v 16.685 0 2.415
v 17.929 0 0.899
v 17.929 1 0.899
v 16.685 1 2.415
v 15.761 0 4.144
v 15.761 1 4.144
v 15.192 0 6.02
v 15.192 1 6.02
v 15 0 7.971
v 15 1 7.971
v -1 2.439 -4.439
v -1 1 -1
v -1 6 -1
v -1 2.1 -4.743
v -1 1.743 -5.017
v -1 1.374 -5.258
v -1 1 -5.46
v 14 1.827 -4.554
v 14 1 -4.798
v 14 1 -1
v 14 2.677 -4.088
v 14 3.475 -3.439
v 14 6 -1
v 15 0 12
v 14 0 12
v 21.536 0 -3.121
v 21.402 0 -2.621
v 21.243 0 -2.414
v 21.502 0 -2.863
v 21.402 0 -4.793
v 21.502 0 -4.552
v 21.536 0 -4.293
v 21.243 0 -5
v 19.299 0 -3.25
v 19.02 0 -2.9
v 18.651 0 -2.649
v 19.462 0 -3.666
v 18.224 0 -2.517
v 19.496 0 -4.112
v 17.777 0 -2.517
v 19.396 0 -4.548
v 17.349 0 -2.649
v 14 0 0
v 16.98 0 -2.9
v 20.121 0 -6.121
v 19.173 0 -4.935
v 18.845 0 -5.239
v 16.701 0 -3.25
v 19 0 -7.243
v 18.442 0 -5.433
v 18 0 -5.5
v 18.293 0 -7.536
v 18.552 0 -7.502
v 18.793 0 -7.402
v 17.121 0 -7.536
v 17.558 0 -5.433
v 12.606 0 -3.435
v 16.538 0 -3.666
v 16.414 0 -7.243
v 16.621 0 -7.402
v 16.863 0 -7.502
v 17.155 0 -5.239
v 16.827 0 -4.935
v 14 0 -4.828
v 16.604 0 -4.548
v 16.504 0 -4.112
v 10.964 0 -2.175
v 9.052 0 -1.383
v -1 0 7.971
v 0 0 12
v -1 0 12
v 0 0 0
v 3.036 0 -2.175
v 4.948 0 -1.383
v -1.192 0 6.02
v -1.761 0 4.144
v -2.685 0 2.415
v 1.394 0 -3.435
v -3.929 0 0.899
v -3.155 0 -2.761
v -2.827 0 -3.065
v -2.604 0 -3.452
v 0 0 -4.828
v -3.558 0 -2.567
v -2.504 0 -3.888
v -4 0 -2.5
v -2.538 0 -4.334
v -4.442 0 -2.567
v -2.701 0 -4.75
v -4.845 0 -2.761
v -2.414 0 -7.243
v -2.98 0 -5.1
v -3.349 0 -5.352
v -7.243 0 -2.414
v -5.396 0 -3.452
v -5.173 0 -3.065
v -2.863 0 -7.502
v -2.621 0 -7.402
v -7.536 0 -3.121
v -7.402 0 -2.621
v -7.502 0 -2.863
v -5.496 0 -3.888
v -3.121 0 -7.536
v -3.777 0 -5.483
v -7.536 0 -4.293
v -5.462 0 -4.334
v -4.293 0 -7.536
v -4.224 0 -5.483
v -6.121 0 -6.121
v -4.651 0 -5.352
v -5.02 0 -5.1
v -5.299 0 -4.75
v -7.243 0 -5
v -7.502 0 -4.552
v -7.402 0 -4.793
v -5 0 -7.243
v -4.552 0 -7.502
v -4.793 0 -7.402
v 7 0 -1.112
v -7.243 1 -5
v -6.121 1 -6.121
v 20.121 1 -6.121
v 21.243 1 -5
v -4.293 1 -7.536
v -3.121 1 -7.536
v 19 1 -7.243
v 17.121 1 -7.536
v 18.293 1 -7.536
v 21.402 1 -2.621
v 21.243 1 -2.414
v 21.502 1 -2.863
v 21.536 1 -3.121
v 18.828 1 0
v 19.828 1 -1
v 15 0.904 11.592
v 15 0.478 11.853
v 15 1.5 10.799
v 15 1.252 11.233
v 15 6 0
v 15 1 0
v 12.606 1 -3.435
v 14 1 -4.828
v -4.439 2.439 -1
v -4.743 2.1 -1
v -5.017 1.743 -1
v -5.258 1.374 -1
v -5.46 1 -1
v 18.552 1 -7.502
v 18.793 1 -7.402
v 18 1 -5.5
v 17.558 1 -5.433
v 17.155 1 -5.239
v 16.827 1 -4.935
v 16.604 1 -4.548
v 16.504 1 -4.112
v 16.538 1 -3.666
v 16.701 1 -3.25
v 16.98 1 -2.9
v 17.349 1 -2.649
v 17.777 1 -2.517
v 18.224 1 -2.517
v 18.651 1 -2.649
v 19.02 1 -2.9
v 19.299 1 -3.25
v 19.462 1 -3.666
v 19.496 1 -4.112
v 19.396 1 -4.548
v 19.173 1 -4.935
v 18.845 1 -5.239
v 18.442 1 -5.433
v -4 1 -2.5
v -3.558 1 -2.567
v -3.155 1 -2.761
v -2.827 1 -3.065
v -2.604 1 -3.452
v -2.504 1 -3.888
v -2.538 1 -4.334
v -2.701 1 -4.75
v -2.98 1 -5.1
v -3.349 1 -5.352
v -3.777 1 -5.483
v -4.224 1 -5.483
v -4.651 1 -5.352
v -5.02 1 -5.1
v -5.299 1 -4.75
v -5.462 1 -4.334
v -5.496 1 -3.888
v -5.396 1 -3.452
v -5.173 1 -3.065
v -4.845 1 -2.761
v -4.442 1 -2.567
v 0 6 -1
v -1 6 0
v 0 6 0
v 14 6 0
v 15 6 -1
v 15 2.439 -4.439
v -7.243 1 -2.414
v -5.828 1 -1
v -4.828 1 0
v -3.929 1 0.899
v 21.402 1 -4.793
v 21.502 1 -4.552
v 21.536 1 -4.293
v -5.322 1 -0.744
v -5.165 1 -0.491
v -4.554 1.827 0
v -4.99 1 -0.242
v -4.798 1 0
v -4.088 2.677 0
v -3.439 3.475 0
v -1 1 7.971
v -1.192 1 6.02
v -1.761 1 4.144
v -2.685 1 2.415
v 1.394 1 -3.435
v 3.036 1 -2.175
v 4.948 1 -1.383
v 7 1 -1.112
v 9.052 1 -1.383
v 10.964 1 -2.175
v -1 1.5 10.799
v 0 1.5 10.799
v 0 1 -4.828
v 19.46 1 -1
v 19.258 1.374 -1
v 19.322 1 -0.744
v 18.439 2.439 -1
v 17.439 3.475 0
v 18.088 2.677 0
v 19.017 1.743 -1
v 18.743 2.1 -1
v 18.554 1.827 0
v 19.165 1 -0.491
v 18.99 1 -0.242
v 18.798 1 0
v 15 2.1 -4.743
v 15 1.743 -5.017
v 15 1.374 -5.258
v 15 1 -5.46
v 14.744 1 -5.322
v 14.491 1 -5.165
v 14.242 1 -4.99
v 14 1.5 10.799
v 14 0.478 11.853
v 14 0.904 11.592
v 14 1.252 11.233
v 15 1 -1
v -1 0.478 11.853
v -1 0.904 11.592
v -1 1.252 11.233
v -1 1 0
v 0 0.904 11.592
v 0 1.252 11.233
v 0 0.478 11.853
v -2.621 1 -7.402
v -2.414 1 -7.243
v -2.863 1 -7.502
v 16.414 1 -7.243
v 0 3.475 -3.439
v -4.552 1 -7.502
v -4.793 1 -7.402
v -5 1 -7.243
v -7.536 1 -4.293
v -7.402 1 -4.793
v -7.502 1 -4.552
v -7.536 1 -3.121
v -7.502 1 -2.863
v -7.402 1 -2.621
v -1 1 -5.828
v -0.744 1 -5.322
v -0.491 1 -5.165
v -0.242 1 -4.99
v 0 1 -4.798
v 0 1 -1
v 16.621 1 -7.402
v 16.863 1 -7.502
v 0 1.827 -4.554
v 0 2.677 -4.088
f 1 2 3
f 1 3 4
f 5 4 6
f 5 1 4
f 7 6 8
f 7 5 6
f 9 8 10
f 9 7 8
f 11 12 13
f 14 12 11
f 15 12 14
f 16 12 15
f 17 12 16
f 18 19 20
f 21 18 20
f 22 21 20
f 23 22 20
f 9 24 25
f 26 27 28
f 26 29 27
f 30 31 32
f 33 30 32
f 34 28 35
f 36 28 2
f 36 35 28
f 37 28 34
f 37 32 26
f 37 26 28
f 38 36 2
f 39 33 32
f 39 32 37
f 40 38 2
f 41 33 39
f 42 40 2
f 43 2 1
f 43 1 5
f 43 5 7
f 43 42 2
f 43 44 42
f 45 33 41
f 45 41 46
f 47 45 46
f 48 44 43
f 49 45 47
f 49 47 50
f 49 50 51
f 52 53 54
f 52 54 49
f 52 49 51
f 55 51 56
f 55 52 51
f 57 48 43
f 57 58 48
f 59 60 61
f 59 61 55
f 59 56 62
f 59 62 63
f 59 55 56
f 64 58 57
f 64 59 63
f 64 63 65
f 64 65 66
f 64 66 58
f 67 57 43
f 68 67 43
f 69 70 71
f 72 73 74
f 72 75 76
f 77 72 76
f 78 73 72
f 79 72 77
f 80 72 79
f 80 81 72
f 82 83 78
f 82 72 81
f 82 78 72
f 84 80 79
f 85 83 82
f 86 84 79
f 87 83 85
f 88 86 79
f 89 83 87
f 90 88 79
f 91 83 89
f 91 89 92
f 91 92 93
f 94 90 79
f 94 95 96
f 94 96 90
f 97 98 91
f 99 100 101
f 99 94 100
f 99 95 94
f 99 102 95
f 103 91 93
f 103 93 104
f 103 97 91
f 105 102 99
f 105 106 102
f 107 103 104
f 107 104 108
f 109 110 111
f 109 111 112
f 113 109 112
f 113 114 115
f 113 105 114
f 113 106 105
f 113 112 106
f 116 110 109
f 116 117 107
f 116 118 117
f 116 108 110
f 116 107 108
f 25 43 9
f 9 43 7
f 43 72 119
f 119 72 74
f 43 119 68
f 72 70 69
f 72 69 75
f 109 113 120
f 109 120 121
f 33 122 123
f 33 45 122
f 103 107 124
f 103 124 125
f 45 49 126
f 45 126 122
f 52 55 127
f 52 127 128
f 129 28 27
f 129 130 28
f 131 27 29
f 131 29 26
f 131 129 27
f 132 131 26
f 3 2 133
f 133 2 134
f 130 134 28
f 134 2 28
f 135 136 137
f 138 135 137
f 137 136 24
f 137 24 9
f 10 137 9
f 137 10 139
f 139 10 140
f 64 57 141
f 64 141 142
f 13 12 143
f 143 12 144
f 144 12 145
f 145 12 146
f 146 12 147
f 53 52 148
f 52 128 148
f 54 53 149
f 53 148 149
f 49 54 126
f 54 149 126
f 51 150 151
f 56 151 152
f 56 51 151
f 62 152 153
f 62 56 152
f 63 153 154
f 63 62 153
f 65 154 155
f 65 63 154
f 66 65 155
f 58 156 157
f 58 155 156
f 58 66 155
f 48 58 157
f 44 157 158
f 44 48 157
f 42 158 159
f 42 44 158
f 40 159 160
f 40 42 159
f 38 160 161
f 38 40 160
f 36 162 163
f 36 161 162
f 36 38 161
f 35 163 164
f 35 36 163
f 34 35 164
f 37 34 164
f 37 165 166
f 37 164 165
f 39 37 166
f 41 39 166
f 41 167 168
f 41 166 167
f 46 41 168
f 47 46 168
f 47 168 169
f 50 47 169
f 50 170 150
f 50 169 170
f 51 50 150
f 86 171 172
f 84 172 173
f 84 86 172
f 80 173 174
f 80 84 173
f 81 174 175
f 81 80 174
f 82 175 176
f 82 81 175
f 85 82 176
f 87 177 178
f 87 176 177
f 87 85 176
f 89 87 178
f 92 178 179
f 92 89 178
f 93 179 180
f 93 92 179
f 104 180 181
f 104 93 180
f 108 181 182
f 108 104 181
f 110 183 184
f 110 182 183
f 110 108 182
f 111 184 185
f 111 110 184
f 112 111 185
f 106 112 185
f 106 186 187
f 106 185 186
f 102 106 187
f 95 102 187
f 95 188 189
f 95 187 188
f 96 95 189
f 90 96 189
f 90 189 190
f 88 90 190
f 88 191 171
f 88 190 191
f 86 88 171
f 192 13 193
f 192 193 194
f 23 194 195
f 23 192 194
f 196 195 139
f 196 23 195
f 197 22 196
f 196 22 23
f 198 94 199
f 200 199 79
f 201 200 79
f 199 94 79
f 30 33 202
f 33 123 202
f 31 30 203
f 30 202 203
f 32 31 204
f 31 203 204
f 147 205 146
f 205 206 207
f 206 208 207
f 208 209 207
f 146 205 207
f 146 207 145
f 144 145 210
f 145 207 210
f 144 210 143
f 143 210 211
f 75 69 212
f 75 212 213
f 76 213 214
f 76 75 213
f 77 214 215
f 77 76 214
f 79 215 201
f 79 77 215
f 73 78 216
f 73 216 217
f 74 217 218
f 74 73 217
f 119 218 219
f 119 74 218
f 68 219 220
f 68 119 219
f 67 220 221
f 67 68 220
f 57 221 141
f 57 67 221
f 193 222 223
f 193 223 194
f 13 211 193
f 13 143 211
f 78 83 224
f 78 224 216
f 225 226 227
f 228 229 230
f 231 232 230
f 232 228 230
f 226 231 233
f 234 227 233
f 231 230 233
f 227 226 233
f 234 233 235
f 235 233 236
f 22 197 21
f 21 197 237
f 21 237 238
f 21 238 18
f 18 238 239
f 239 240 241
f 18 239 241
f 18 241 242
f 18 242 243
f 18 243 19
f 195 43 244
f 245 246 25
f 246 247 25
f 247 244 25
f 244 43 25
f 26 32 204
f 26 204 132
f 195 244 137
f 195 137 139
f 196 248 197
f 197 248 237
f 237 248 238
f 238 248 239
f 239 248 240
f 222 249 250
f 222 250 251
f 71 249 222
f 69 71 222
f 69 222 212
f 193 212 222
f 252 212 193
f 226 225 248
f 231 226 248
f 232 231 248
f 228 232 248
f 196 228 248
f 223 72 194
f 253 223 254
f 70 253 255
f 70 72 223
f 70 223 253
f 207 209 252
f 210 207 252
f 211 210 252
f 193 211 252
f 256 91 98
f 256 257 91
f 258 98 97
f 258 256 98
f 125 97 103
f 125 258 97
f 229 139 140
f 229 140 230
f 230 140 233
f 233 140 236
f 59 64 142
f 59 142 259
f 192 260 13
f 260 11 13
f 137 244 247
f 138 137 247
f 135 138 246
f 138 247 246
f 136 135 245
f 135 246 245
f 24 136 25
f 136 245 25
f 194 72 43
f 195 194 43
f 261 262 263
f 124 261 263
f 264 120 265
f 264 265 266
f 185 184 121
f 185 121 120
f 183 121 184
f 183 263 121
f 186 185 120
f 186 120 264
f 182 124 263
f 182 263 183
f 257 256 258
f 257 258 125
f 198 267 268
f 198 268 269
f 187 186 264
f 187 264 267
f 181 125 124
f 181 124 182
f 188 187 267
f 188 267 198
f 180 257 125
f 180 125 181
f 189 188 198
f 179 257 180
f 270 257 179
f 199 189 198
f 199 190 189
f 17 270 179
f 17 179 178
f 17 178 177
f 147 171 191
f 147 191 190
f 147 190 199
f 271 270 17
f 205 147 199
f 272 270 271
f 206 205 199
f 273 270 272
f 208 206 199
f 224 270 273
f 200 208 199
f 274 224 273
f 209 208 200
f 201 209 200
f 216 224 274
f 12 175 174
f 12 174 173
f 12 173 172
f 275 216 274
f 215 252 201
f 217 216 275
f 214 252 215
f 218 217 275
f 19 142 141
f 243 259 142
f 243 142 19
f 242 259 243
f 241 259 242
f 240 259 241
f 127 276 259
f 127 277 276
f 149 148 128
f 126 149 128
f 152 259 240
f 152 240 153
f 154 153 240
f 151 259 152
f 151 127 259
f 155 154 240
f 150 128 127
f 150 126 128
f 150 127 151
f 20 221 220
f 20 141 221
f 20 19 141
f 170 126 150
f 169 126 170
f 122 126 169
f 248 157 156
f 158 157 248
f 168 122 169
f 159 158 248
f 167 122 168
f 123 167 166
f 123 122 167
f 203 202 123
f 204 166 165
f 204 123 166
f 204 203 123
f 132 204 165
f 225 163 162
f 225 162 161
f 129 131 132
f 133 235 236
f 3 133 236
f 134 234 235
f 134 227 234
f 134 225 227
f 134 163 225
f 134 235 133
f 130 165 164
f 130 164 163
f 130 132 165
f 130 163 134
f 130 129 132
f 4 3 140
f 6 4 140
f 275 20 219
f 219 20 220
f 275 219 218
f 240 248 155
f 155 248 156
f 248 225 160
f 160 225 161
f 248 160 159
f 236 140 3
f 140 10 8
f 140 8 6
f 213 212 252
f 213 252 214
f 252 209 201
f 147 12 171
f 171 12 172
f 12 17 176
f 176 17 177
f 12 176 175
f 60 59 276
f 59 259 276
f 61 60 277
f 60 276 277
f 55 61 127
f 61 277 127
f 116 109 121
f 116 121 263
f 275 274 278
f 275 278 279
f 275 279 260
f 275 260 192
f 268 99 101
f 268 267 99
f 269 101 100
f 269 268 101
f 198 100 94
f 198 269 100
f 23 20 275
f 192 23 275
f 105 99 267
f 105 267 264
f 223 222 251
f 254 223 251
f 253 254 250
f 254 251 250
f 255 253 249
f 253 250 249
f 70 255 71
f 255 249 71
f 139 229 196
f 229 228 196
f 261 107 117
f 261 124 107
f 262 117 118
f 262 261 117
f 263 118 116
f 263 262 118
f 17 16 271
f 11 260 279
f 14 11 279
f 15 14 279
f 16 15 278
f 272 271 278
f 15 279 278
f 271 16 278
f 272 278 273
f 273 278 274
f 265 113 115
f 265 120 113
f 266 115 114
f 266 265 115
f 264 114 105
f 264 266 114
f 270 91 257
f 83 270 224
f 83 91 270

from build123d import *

# Parameters (mm, degrees)
BOSS_EXTRUDE5_DEPTH = 1
BOSS_EXTRUDE6_DEPTH = 5
BOSS_EXTRUDE7_DEPTH = 5
BOSS_EXTRUDE8_DEPTH = 5
CUT_EXTRUDE2_DEPTH  = 27.226956509
CUT_EXTRUDE3_DEPTH  = 27.226956509
CUT_EXTRUDE4_DEPTH  = 26.860820726
FILLET1_R           = 1
SKETCH2_10_R        = 1.5
CUT_EXTRUDE5_DEPTH  = 26.372860474
FILLET2_R           = 1
FILLET3_R           = 2


with BuildPart() as part:
    # Sketch2 → Boss-Extrude5 (new body)
    with BuildSketch(Plane(origin=(0, 0, 0), x_dir=(1, 0, 0), z_dir=(0, 1, 0))):
        with BuildLine():
            Line((-2.70717244, 7.535599565), (-1, 5.828427125))
            Line((-1, 5.828427125), (0, 4.828427125))
            Line((0, 4.828427125), (1.393918238, 3.434508886))
            ThreePointArc((1.393918238, 3.434508886), (7, 1.112393789), (12.606081762, 3.434508886))
            Line((12.606081762, 3.434508886), (14, 4.828427125))
            Line((14, 4.828427125), (15, 5.828427125))
            Line((15, 5.828427125), (16.70717244, 7.535599565))
            Line((16.70717244, 7.535599565), (18.70717244, 7.535599565))
            Line((18.70717244, 7.535599565), (20.121386002, 6.121386002))
            Line((20.121386002, 6.121386002), (21.535599565, 4.70717244))
            Line((21.535599565, 4.70717244), (21.535599565, 2.70717244))
            Line((21.535599565, 2.70717244), (19.828427125, 1))
            Line((19.828427125, 1), (18.828427125, 0))
            Line((18.828427125, 0), (17.928932188, -0.899494937))
            ThreePointArc((17.928932188, -0.899494937), (15.761204675, -4.143728425), (15, -7.970562748))
            Line((15, -7.970562748), (15, -12))
            Line((15, -12), (14, -12))
            Line((14, -12), (14, 0))
            Line((14, 0), (0, 0))
            Line((0, 0), (0, -12))
            Line((0, -12), (-1, -12))
            Line((-1, -12), (-1, -7.970562748))
            ThreePointArc((-1, -7.970562748), (-1.761204675, -4.143728425), (-3.928932188, -0.899494937))
            Line((-3.928932188, -0.899494937), (-4.828427125, 0))
            Line((-4.828427125, 0), (-5.828427125, 1))
            Line((-5.828427125, 1), (-7.535599565, 2.70717244))
            Line((-7.535599565, 2.70717244), (-7.535599565, 4.70717244))
            Line((-7.535599565, 4.70717244), (-6.121386002, 6.121386002))
            Line((-6.121386002, 6.121386002), (-4.70717244, 7.535599565))
            Line((-4.70717244, 7.535599565), (-2.70717244, 7.535599565))
        make_face()
    extrude(amount=BOSS_EXTRUDE5_DEPTH)

    # Sketch5 → Boss-Extrude6 (add)
    with BuildSketch(Plane(origin=(0, 1, 0), x_dir=(1, 0, 0), z_dir=(0, 1, 0))):
        Polygon((-4.828427125, 0), (18.828427125, 0), (19.828427125, 1), (-5.828427125, 1), align=None)
    extrude(amount=BOSS_EXTRUDE6_DEPTH)

    # Sketch5<3> → Boss-Extrude7 (add)
    with BuildSketch(Plane(origin=(0, 1, 0), x_dir=(1, 0, 0), z_dir=(0, 1, 0))):
        Polygon((-1, -12), (-1, 5.828427125), (0, 4.828427125), (0, -12), align=None)
    extrude(amount=BOSS_EXTRUDE7_DEPTH)

    # Sketch5<4> → Boss-Extrude8 (add)
    with BuildSketch(Plane(origin=(0, 1, 0), x_dir=(1, 0, 0), z_dir=(0, 1, 0))):
        Polygon((15, -12), (15, 5.828427125), (14, 4.828427125), (14, -12), align=None)
    extrude(amount=BOSS_EXTRUDE8_DEPTH)

    # Sketch6 → Cut-Extrude2 (cut, through all)
    with BuildSketch(Plane.ZY.offset(1)):
        Polygon((12, 1), (0, 6), (12, 6), align=None)
    extrude(amount=-CUT_EXTRUDE2_DEPTH, mode=Mode.SUBTRACT)

    # Sketch7 → Cut-Extrude3 (cut, through all)
    with BuildSketch(Plane.ZY.offset(1)):
        Polygon((-5.828427125, 1), (-1, 6), (-5.828427125, 6), align=None)
    extrude(amount=-CUT_EXTRUDE3_DEPTH, mode=Mode.SUBTRACT)

    # Sketch9 → Cut-Extrude4 (cut, through all)
    with BuildSketch(Plane(origin=(0, 0, -1), x_dir=(-1, 0, 0), z_dir=(0, 0, -1))):
        Polygon((5.828427125, 1), (1, 6), (5.828427125, 6), align=None)
        Polygon((-15, 6), (-19.828427125, 6), (-19.828427125, 1), align=None)
    extrude(amount=-CUT_EXTRUDE4_DEPTH, mode=Mode.SUBTRACT)

    # Fillet1
    fillet1_edges = [part.edges().sort_by_distance(p)[0] for p in [
        (21.535599565, 0.5, -2.70717244),
        (21.535599565, 0.5, -4.70717244),
        (18.70717244, 0.5, -7.535599565),
        (16.70717244, 0.5, -7.535599565),
    ]]
    fillet(fillet1_edges, radius=FILLET1_R)

    # Sketch2<10> → Cut-Extrude5 (cut, through all)
    with BuildSketch(Plane(origin=(0, 0, 0), x_dir=(1, 0, 0), z_dir=(0, 1, 0))):
        with Locations(Location((-4.000065659, 4.000065659, 0), (0, 0, 270))):
            Circle(SKETCH2_10_R)
        with Locations(Location((18.000065659, 4.000065659, 0), (0, 0, 90))):
            Circle(SKETCH2_10_R)
    extrude(amount=CUT_EXTRUDE5_DEPTH, mode=Mode.SUBTRACT)

    # Fillet2
    fillet2_edges = [part.edges().sort_by_distance(p)[0] for p in [
        (-4.70717244, 0.5, -7.535599565),
        (-7.535599565, 0.5, -4.70717244),
        (-7.535599565, 0.5, -2.70717244),
        (-2.70717244, 0.5, -7.535599565),
    ]]
    fillet(fillet2_edges, radius=FILLET2_R)

    # Fillet3
    # the kernel refuses this fillet: 2 mm, written as the material it takes off along each edge
    with BuildSketch(Plane(origin=(16.627933811, -0.685780658, -7.456360936), x_dir=(-0.41774894469873675, -0.8068281343670279, 0.4177489446987422), z_dir=(-0.5705136450630144, 0.5907862232600055, 0.5705136450630186))) as fillet3_piece_1_section:
        with BuildLine():
            CenterArc((FILLET3_R * 0.570690578744, FILLET3_R), FILLET3_R, 210.574008732, 59.425991268)
            Line((-FILLET3_R * 0.290282277773, FILLET3_R * 0.491349097769), (0, 0))
            Line((0, 0), (FILLET3_R * 0.570690578744, 0))
        make_face()
    fillet3_piece_1 = extrude(amount=7.459712243, mode=Mode.PRIVATE)
    fillet3_piece_1 = split(fillet3_piece_1, bisect_by=Plane(origin=(16.627933811, 1, -7.456360936), z_dir=(0, 1, 0)), keep=Keep.TOP, mode=Mode.PRIVATE)
    add(fillet3_piece_1, mode=Mode.SUBTRACT)
    with BuildSketch(Plane(origin=(1.627933811, 3.721314564, -3.200493313), x_dir=(0.41774894469873974, -0.8068281343670296, 0.41774894469873625), z_dir=(-0.5705136450630193, -0.5907862232600034, -0.5705136450630159))) as fillet3_piece_2_section:
        with BuildLine():
            CenterArc((FILLET3_R * 0.570690578744, FILLET3_R), FILLET3_R, 210.574008732, 59.425991268)
            Line((-FILLET3_R * 0.290282277773, FILLET3_R * 0.491349097769), (0, 0))
            Line((0, 0), (FILLET3_R * 0.570690578744, 0))
        make_face()
    fillet3_piece_2 = extrude(amount=7.459712243, mode=Mode.PRIVATE)
    fillet3_piece_2 = split(fillet3_piece_2, bisect_by=Plane(origin=(1.627933811, 1, -3.200493313), z_dir=(0, 1, 0)), keep=Keep.TOP, mode=Mode.PRIVATE)
    add(fillet3_piece_2, mode=Mode.SUBTRACT)
    with BuildSketch(Plane(origin=(-3.200493313, 3.721314564, 1.627933811), x_dir=(0.417748944698757, -0.8068281343670092, 0.4177489446987582), z_dir=(-0.570513645063002, -0.5907862232600312, -0.5705136450630045))) as fillet3_piece_3_section:
        with BuildLine():
            CenterArc((FILLET3_R * 0.570690578744, -FILLET3_R), FILLET3_R, 90, 59.425991268)
            Line((-FILLET3_R * 0.290282277773, -FILLET3_R * 0.491349097769), (0, 0))
            Line((0, 0), (FILLET3_R * 0.570690578744, 0))
        make_face()
    fillet3_piece_3 = extrude(amount=7.459712243, mode=Mode.PRIVATE)
    fillet3_piece_3 = split(fillet3_piece_3, bisect_by=Plane(origin=(-3.200493313, 1, 1.627933811), z_dir=(0, 1, 0)), keep=Keep.TOP, mode=Mode.PRIVATE)
    add(fillet3_piece_3, mode=Mode.SUBTRACT)
    with BuildSketch(Plane(origin=(17.200493313, 3.721314564, 1.627933811), x_dir=(-0.4177489446987597, -0.8068281343670061, 0.41774894469876167), z_dir=(0.5705136450629996, -0.5907862232600355, -0.5705136450630022))) as fillet3_piece_4_section:
        with BuildLine():
            CenterArc((FILLET3_R * 0.570690578744, FILLET3_R), FILLET3_R, 210.574008732, 59.425991268)
            Line((-FILLET3_R * 0.290282277773, FILLET3_R * 0.491349097769), (0, 0))
            Line((0, 0), (FILLET3_R * 0.570690578744, 0))
        make_face()
    fillet3_piece_4 = extrude(amount=7.459712243, mode=Mode.PRIVATE)
    fillet3_piece_4 = split(fillet3_piece_4, bisect_by=Plane(origin=(17.200493313, 1, 1.627933811), z_dir=(0, 1, 0)), keep=Keep.TOP, mode=Mode.PRIVATE)
    add(fillet3_piece_4, mode=Mode.SUBTRACT)
    with BuildSketch(Plane(origin=(10.748288019, 1, 12), x_dir=(0, -1, 0), z_dir=(1, 0, 0)), Plane(origin=(-4.251711981, 1, 12), x_dir=(0, -1, 0), z_dir=(1, 0, 0))) as fillet3_piece_5:
        with BuildLine():
            CenterArc((1.345890464, 1.969862885), FILLET3_R, 202.619864948, 57.421029607)
            Line((-0.500263382, 1.200632116), (0, 0))
            Line((0, 0), (1, 0))
        make_face()
    extrude(amount=7.503423962, mode=Mode.SUBTRACT)


solid = part.part
